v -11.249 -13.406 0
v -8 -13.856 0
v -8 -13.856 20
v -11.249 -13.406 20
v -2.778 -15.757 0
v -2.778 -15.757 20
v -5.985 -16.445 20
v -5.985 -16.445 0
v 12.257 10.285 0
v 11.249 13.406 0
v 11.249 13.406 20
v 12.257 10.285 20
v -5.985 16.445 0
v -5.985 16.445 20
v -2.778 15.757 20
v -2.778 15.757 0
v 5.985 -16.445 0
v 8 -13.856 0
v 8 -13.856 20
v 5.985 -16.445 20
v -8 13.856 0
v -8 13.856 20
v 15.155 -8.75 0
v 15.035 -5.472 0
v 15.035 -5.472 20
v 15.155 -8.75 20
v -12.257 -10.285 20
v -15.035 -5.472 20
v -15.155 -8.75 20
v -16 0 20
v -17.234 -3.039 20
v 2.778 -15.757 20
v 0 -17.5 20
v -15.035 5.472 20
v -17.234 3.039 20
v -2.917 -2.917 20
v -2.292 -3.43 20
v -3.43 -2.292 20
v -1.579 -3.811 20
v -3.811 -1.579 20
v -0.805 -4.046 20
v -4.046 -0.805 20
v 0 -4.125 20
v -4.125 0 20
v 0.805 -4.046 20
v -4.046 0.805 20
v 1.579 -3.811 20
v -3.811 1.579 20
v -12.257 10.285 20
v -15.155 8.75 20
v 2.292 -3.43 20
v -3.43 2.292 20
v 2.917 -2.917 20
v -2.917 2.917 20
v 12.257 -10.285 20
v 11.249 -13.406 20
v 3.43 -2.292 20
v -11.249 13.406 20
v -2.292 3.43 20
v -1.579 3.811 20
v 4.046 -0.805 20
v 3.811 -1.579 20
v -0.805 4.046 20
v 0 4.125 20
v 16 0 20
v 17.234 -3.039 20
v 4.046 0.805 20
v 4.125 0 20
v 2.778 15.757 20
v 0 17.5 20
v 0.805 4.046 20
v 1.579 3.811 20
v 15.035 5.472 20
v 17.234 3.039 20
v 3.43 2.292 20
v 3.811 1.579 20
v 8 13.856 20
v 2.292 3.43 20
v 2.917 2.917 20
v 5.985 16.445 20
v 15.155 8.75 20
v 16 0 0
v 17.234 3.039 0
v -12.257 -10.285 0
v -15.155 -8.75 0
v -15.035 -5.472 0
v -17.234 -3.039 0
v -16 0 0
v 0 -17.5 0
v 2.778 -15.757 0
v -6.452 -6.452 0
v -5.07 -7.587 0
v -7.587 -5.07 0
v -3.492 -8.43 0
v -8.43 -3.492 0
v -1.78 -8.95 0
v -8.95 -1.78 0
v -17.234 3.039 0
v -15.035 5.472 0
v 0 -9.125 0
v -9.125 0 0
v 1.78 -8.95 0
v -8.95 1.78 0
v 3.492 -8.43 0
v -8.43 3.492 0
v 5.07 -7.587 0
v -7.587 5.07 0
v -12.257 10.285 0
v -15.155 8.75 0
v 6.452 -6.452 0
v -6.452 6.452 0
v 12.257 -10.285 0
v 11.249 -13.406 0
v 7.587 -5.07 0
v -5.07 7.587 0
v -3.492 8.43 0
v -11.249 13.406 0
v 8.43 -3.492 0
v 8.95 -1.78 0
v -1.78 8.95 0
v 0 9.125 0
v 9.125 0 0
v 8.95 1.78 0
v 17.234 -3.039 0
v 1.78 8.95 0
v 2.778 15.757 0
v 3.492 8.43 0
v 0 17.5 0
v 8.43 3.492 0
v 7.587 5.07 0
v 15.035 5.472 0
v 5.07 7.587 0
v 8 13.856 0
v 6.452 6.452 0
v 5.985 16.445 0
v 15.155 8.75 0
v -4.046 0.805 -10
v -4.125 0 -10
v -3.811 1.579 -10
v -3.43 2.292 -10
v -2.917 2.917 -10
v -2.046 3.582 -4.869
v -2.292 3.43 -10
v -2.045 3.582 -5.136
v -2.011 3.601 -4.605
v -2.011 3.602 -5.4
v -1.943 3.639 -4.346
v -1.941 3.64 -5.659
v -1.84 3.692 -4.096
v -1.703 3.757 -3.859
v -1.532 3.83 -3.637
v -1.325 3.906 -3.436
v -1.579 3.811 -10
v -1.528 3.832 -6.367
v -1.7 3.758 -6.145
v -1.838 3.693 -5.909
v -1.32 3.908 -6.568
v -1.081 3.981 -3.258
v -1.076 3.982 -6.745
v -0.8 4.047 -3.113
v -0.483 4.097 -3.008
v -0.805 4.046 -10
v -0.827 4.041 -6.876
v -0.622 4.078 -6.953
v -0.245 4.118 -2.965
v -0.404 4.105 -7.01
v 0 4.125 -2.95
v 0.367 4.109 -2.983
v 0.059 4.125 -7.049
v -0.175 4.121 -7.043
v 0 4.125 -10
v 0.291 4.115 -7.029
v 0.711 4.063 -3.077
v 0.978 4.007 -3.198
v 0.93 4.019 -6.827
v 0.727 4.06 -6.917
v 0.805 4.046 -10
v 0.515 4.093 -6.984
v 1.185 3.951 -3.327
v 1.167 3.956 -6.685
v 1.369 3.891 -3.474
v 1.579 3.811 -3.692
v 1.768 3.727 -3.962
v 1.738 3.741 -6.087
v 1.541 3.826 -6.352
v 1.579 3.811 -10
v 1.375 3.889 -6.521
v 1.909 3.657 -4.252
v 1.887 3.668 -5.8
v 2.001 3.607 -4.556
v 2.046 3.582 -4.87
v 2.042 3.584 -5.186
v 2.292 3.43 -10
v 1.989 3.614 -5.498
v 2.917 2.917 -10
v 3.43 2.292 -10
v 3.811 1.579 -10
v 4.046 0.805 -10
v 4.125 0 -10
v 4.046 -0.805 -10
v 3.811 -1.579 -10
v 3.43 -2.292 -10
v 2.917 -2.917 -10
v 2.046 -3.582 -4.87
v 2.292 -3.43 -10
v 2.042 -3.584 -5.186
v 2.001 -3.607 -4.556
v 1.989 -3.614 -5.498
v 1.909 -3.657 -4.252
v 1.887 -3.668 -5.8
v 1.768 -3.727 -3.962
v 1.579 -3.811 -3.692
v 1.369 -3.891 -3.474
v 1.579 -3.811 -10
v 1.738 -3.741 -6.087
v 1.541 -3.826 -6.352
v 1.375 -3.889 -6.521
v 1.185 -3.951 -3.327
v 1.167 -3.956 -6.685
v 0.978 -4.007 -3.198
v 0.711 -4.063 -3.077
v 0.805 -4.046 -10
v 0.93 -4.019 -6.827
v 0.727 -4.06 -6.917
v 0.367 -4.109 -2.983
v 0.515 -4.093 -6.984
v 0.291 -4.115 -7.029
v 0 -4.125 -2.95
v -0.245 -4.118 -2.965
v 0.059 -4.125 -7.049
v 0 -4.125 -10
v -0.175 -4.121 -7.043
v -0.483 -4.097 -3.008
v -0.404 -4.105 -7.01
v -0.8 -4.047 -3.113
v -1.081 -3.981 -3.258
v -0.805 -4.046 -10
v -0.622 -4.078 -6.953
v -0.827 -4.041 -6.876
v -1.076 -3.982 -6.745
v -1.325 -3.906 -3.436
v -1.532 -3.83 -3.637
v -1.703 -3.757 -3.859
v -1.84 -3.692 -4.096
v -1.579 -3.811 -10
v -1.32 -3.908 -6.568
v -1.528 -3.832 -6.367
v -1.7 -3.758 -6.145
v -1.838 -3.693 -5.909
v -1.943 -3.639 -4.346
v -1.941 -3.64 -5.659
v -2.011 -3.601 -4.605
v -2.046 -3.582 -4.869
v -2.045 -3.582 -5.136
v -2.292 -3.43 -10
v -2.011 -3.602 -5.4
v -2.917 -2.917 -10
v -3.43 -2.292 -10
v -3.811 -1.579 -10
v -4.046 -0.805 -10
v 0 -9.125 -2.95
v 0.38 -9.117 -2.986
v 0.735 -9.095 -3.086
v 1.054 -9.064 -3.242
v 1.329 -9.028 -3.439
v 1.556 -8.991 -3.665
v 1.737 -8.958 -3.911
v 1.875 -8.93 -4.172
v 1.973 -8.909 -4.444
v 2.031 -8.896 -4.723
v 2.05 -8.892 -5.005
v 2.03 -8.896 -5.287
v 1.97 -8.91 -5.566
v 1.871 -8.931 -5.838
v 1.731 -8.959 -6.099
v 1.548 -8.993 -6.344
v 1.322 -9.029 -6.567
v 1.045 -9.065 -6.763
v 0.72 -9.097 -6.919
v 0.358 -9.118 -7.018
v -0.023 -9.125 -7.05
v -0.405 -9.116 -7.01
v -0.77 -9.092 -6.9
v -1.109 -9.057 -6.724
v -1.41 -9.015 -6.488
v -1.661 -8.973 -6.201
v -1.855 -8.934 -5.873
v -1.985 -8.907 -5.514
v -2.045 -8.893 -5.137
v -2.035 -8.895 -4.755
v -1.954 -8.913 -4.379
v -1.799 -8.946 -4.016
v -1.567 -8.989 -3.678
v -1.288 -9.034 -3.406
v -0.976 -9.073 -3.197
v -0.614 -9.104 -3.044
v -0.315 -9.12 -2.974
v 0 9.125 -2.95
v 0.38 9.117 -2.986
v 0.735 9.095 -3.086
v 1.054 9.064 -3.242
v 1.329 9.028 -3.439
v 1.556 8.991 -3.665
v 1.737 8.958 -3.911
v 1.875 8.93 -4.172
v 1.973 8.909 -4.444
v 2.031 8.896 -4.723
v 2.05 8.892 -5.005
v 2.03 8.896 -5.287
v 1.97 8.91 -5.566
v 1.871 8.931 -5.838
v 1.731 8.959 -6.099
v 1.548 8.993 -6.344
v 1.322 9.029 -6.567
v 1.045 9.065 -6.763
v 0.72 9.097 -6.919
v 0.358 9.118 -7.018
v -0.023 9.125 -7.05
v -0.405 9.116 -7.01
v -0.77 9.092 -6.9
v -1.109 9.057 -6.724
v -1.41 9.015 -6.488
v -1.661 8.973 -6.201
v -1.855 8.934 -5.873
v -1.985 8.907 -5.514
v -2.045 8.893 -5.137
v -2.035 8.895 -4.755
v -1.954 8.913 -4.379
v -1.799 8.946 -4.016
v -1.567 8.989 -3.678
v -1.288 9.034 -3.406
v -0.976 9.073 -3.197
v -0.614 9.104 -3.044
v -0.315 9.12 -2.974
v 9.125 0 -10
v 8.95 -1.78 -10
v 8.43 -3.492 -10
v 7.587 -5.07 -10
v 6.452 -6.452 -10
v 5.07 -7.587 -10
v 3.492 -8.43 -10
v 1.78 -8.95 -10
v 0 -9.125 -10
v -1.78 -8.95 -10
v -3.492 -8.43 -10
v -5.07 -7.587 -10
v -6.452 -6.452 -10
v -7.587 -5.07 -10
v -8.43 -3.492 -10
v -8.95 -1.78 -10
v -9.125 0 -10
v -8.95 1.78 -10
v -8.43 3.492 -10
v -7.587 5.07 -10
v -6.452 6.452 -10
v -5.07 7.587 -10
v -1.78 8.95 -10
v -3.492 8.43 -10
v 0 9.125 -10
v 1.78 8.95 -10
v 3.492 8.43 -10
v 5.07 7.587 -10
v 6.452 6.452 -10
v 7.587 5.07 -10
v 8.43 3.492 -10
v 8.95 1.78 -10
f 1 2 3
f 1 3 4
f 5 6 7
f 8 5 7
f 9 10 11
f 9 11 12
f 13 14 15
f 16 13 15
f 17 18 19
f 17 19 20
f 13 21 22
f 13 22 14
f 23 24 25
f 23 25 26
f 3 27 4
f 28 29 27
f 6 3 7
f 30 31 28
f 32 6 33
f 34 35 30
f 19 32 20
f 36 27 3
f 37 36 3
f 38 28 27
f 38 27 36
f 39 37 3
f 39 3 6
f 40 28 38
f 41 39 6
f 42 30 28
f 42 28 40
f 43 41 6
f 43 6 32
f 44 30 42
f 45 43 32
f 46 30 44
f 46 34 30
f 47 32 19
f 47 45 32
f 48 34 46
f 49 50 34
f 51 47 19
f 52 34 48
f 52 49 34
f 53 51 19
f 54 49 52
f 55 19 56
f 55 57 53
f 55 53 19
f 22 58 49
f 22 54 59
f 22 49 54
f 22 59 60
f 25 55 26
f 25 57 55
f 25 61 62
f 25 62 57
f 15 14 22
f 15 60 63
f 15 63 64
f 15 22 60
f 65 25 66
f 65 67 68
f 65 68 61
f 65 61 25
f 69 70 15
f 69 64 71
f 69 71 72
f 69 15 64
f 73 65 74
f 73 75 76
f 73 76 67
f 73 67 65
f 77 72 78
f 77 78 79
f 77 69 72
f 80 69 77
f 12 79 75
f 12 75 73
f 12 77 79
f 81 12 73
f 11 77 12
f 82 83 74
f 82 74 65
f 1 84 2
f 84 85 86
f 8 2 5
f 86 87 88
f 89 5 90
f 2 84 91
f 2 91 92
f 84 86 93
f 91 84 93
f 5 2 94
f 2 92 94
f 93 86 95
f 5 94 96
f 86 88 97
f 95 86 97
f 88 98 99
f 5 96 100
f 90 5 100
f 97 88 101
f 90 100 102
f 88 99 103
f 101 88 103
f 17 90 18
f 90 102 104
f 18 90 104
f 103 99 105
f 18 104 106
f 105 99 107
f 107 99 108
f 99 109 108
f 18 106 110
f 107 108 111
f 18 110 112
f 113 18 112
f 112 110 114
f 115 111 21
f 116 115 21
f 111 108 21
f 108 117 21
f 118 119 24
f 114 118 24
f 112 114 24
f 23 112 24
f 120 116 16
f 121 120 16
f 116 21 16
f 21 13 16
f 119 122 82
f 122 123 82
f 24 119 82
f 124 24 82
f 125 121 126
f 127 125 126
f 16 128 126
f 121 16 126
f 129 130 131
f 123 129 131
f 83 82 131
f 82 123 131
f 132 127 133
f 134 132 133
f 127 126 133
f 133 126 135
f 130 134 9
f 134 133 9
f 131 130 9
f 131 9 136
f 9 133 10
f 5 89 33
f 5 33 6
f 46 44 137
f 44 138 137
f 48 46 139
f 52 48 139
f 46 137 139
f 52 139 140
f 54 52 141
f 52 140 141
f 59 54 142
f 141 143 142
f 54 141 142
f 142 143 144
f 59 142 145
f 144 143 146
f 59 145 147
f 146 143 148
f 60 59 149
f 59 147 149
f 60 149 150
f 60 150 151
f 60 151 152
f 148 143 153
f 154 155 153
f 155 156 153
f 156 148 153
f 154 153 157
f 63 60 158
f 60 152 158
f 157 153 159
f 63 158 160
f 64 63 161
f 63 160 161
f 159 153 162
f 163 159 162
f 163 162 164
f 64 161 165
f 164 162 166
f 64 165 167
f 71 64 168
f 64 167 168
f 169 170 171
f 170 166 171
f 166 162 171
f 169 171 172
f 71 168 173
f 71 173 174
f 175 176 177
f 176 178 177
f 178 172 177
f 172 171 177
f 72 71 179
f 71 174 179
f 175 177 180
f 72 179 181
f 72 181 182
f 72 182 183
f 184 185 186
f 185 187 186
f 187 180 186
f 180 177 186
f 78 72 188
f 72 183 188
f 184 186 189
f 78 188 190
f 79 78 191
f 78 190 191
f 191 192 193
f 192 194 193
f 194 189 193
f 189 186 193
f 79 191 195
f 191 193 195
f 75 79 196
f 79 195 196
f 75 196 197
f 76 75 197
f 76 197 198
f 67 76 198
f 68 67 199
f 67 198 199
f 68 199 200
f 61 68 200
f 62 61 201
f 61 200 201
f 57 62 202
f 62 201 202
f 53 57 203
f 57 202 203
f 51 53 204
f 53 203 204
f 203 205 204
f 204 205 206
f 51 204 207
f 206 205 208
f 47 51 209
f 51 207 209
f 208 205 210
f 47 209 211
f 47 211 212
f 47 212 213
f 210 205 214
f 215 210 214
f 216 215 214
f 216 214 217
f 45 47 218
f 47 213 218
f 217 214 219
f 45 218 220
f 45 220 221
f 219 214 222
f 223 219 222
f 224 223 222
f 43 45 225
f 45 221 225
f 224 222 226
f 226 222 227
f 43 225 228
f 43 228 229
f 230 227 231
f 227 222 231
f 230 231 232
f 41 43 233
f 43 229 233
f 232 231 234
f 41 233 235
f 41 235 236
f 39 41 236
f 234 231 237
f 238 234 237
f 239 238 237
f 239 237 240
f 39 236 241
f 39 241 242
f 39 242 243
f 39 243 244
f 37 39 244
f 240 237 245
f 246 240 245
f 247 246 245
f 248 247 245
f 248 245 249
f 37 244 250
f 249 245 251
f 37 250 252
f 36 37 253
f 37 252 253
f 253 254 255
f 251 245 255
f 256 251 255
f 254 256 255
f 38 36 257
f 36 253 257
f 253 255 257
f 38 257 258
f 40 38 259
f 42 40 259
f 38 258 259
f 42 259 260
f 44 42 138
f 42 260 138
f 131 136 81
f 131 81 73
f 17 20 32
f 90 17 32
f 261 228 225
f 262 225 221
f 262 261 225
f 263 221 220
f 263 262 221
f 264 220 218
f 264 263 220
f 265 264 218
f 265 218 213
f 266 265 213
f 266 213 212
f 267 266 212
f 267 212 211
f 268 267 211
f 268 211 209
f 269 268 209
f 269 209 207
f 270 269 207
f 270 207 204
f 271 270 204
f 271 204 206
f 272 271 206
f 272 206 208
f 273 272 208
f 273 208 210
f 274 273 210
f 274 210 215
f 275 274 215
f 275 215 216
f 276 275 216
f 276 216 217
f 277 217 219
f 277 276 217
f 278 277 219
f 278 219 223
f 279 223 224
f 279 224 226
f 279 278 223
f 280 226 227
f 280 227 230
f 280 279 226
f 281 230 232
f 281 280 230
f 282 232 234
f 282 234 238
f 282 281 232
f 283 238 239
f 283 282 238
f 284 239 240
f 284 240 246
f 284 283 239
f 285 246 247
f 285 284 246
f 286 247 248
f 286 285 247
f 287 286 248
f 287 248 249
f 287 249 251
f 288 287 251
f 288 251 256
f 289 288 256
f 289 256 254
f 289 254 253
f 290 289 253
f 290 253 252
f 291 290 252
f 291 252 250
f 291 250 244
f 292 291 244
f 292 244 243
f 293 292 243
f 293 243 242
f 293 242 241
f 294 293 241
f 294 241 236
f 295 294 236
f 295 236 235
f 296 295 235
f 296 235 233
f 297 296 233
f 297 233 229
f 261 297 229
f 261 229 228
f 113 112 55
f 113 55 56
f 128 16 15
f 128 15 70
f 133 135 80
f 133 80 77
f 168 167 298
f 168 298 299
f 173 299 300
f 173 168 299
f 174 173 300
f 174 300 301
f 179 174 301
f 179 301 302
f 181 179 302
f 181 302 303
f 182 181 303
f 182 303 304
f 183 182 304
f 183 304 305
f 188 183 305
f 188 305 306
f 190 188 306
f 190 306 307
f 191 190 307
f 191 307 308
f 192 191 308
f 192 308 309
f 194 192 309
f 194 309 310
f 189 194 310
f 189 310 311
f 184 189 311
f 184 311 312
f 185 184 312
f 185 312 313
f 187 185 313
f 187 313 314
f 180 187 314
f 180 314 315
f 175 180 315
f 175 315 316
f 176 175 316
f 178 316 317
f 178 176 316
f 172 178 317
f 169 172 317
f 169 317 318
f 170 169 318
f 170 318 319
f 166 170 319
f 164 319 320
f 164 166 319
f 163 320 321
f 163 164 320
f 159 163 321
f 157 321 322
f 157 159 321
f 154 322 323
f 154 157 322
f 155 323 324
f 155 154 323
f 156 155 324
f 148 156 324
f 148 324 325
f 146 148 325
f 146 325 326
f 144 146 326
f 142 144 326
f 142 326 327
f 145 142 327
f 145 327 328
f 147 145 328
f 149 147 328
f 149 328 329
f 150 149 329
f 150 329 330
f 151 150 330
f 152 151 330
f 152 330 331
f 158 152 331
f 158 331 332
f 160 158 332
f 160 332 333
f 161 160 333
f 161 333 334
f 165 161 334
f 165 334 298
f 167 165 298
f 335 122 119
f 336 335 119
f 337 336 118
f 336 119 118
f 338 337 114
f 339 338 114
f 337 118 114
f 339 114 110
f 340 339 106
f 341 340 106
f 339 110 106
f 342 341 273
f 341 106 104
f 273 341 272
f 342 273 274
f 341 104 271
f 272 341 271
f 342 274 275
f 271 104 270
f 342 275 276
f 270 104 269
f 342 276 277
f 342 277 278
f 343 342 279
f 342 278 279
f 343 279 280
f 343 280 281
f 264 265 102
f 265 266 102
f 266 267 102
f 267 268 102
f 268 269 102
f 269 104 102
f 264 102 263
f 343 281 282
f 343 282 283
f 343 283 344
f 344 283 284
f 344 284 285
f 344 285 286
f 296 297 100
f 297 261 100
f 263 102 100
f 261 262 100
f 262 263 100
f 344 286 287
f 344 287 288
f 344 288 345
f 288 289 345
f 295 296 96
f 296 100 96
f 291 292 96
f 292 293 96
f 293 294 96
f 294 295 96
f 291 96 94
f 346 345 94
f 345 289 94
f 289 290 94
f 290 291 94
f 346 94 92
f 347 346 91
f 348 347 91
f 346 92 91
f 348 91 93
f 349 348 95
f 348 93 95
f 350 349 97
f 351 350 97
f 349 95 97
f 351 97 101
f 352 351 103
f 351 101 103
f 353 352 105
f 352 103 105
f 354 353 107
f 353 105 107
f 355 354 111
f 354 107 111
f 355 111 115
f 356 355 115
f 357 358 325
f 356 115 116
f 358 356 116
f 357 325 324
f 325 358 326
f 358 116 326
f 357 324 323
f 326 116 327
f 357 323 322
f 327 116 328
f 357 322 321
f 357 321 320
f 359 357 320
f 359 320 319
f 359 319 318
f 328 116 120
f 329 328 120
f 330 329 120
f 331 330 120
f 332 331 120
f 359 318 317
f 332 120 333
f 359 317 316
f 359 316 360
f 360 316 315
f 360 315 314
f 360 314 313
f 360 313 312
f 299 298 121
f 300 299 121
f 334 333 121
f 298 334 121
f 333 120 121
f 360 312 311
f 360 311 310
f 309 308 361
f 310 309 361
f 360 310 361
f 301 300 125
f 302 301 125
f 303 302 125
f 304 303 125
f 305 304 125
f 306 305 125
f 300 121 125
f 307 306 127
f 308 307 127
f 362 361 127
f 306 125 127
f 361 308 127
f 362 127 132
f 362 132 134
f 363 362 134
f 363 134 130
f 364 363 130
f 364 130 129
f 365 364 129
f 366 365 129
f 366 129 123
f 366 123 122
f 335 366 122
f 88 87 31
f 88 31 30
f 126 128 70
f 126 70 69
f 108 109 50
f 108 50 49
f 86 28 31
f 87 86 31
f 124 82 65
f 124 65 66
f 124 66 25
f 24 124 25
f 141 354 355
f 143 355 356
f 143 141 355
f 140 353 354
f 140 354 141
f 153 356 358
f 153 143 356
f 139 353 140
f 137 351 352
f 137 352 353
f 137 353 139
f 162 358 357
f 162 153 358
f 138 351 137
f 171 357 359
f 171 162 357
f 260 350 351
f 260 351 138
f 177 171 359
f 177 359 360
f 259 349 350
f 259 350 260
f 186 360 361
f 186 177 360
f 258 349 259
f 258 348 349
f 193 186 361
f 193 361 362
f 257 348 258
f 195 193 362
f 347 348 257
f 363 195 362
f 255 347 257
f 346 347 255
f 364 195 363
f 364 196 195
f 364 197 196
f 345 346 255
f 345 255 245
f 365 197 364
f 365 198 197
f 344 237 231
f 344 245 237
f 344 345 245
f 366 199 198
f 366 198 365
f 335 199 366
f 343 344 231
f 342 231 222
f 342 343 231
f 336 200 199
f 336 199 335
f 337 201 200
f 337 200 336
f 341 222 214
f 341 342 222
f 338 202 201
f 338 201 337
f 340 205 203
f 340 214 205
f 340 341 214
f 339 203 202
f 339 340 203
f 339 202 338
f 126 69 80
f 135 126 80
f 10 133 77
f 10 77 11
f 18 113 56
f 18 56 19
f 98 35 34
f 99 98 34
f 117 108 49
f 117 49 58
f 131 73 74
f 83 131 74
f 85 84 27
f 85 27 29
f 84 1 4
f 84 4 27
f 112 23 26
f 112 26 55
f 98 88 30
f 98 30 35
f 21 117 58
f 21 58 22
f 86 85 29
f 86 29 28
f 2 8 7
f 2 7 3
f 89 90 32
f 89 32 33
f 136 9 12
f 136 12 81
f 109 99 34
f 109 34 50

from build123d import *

# Parameters (mm, degrees)
CROQUIS1_R                 = 17.5
SALIENTE_EXTRUIR1_DEPTH    = 20
CROQUIS2_R                 = 9.125
CROQUIS2_R_2               = 4.125
SALIENTE_EXTRUIR2_DEPTH    = 10
CORTAR_EXTRUIR1_START      = -20
CROQUIS3_R                 = 19
CORTAR_EXTRUIR1_DEPTH      = 20
CORTAR_EXTRUIR2_DEPTH      = 32.674365543
CORTAR_EXTRUIR2_DEPTH_BACK = 32.674365543
CROQUIS4_R                 = 2.05
CROQUIS5_R                 = 4.125
CORTAR_EXTRUIR3_DEPTH      = 32.674365543


with BuildPart() as part:
    # Croquis1 → Saliente-Extruir1 (new body)
    with BuildSketch(Plane.XY):
        Circle(CROQUIS1_R)
    extrude(amount=SALIENTE_EXTRUIR1_DEPTH)

    # Croquis2 → Saliente-Extruir2 (add)
    with BuildSketch(Plane(origin=(0, 0, 0), x_dir=(-1, 0, 0), z_dir=(0, 0, -1))):
        with Locations(Location((0, 0, 0), (0, 0, 180))):
            Circle(CROQUIS2_R)
        Circle(CROQUIS2_R_2, mode=Mode.SUBTRACT)
    extrude(amount=SALIENTE_EXTRUIR2_DEPTH)

    # Croquis3 → Cortar-Extruir1 (cut)
    with BuildSketch(Plane.XY.offset(20).offset(CORTAR_EXTRUIR1_START)):
        Circle(CROQUIS3_R)
        Polygon((0, 17.5), (2.778370843, 15.756924048), (5.985352508, 16.444620864), (8, 13.856406461), (11.24878317, 13.405777755), (12.25671109, 10.284601755), (15.155444566, 8.75), (15.035081933, 5.472322293), (17.234135678, 3.038843109), (16, 0), (17.234135678, -3.038843109), (15.035081933, -5.472322293), (15.155444566, -8.75), (12.25671109, -10.284601755), (11.24878317, -13.405777755), (8, -13.856406461), (5.985352508, -16.444620864), (2.778370843, -15.756924048), (0, -17.5), (-2.778370843, -15.756924048), (-5.985352508, -16.444620864), (-8, -13.856406461), (-11.24878317, -13.405777755), (-12.25671109, -10.284601755), (-15.155444566, -8.75), (-15.035081933, -5.472322293), (-17.234135678, -3.038843109), (-16, 0), (-17.234135678, 3.038843109), (-15.035081933, 5.472322293), (-15.155444566, 8.75), (-12.25671109, 10.284601755), (-11.24878317, 13.405777755), (-8, 13.856406461), (-5.985352508, 16.444620864), (-2.778370843, 15.756924048), align=None, mode=Mode.SUBTRACT)
    extrude(amount=CORTAR_EXTRUIR1_DEPTH, mode=Mode.SUBTRACT)

    # Croquis4 → Cortar-Extruir2 (cut, two sides: drawn at the far end of the back side and taken through both)
    with BuildSketch(Plane(origin=(0, 0, 0), x_dir=(1, 0, 0), z_dir=(0, 1, 0)).offset(-CORTAR_EXTRUIR2_DEPTH_BACK)):
        with Locations(Location((0, 5, 0), (0, 0, 270))):
            Circle(CROQUIS4_R)
    extrude(amount=CORTAR_EXTRUIR2_DEPTH + CORTAR_EXTRUIR2_DEPTH_BACK, mode=Mode.SUBTRACT)

    # Croquis5 → Cortar-Extruir3 (cut, through all)
    with BuildSketch(Plane(origin=(0, 0, 0), x_dir=(-1, 0, 0), z_dir=(0, 0, -1))):
        Circle(CROQUIS5_R)
    extrude(amount=-CORTAR_EXTRUIR3_DEPTH, mode=Mode.SUBTRACT)


solid = part.part
